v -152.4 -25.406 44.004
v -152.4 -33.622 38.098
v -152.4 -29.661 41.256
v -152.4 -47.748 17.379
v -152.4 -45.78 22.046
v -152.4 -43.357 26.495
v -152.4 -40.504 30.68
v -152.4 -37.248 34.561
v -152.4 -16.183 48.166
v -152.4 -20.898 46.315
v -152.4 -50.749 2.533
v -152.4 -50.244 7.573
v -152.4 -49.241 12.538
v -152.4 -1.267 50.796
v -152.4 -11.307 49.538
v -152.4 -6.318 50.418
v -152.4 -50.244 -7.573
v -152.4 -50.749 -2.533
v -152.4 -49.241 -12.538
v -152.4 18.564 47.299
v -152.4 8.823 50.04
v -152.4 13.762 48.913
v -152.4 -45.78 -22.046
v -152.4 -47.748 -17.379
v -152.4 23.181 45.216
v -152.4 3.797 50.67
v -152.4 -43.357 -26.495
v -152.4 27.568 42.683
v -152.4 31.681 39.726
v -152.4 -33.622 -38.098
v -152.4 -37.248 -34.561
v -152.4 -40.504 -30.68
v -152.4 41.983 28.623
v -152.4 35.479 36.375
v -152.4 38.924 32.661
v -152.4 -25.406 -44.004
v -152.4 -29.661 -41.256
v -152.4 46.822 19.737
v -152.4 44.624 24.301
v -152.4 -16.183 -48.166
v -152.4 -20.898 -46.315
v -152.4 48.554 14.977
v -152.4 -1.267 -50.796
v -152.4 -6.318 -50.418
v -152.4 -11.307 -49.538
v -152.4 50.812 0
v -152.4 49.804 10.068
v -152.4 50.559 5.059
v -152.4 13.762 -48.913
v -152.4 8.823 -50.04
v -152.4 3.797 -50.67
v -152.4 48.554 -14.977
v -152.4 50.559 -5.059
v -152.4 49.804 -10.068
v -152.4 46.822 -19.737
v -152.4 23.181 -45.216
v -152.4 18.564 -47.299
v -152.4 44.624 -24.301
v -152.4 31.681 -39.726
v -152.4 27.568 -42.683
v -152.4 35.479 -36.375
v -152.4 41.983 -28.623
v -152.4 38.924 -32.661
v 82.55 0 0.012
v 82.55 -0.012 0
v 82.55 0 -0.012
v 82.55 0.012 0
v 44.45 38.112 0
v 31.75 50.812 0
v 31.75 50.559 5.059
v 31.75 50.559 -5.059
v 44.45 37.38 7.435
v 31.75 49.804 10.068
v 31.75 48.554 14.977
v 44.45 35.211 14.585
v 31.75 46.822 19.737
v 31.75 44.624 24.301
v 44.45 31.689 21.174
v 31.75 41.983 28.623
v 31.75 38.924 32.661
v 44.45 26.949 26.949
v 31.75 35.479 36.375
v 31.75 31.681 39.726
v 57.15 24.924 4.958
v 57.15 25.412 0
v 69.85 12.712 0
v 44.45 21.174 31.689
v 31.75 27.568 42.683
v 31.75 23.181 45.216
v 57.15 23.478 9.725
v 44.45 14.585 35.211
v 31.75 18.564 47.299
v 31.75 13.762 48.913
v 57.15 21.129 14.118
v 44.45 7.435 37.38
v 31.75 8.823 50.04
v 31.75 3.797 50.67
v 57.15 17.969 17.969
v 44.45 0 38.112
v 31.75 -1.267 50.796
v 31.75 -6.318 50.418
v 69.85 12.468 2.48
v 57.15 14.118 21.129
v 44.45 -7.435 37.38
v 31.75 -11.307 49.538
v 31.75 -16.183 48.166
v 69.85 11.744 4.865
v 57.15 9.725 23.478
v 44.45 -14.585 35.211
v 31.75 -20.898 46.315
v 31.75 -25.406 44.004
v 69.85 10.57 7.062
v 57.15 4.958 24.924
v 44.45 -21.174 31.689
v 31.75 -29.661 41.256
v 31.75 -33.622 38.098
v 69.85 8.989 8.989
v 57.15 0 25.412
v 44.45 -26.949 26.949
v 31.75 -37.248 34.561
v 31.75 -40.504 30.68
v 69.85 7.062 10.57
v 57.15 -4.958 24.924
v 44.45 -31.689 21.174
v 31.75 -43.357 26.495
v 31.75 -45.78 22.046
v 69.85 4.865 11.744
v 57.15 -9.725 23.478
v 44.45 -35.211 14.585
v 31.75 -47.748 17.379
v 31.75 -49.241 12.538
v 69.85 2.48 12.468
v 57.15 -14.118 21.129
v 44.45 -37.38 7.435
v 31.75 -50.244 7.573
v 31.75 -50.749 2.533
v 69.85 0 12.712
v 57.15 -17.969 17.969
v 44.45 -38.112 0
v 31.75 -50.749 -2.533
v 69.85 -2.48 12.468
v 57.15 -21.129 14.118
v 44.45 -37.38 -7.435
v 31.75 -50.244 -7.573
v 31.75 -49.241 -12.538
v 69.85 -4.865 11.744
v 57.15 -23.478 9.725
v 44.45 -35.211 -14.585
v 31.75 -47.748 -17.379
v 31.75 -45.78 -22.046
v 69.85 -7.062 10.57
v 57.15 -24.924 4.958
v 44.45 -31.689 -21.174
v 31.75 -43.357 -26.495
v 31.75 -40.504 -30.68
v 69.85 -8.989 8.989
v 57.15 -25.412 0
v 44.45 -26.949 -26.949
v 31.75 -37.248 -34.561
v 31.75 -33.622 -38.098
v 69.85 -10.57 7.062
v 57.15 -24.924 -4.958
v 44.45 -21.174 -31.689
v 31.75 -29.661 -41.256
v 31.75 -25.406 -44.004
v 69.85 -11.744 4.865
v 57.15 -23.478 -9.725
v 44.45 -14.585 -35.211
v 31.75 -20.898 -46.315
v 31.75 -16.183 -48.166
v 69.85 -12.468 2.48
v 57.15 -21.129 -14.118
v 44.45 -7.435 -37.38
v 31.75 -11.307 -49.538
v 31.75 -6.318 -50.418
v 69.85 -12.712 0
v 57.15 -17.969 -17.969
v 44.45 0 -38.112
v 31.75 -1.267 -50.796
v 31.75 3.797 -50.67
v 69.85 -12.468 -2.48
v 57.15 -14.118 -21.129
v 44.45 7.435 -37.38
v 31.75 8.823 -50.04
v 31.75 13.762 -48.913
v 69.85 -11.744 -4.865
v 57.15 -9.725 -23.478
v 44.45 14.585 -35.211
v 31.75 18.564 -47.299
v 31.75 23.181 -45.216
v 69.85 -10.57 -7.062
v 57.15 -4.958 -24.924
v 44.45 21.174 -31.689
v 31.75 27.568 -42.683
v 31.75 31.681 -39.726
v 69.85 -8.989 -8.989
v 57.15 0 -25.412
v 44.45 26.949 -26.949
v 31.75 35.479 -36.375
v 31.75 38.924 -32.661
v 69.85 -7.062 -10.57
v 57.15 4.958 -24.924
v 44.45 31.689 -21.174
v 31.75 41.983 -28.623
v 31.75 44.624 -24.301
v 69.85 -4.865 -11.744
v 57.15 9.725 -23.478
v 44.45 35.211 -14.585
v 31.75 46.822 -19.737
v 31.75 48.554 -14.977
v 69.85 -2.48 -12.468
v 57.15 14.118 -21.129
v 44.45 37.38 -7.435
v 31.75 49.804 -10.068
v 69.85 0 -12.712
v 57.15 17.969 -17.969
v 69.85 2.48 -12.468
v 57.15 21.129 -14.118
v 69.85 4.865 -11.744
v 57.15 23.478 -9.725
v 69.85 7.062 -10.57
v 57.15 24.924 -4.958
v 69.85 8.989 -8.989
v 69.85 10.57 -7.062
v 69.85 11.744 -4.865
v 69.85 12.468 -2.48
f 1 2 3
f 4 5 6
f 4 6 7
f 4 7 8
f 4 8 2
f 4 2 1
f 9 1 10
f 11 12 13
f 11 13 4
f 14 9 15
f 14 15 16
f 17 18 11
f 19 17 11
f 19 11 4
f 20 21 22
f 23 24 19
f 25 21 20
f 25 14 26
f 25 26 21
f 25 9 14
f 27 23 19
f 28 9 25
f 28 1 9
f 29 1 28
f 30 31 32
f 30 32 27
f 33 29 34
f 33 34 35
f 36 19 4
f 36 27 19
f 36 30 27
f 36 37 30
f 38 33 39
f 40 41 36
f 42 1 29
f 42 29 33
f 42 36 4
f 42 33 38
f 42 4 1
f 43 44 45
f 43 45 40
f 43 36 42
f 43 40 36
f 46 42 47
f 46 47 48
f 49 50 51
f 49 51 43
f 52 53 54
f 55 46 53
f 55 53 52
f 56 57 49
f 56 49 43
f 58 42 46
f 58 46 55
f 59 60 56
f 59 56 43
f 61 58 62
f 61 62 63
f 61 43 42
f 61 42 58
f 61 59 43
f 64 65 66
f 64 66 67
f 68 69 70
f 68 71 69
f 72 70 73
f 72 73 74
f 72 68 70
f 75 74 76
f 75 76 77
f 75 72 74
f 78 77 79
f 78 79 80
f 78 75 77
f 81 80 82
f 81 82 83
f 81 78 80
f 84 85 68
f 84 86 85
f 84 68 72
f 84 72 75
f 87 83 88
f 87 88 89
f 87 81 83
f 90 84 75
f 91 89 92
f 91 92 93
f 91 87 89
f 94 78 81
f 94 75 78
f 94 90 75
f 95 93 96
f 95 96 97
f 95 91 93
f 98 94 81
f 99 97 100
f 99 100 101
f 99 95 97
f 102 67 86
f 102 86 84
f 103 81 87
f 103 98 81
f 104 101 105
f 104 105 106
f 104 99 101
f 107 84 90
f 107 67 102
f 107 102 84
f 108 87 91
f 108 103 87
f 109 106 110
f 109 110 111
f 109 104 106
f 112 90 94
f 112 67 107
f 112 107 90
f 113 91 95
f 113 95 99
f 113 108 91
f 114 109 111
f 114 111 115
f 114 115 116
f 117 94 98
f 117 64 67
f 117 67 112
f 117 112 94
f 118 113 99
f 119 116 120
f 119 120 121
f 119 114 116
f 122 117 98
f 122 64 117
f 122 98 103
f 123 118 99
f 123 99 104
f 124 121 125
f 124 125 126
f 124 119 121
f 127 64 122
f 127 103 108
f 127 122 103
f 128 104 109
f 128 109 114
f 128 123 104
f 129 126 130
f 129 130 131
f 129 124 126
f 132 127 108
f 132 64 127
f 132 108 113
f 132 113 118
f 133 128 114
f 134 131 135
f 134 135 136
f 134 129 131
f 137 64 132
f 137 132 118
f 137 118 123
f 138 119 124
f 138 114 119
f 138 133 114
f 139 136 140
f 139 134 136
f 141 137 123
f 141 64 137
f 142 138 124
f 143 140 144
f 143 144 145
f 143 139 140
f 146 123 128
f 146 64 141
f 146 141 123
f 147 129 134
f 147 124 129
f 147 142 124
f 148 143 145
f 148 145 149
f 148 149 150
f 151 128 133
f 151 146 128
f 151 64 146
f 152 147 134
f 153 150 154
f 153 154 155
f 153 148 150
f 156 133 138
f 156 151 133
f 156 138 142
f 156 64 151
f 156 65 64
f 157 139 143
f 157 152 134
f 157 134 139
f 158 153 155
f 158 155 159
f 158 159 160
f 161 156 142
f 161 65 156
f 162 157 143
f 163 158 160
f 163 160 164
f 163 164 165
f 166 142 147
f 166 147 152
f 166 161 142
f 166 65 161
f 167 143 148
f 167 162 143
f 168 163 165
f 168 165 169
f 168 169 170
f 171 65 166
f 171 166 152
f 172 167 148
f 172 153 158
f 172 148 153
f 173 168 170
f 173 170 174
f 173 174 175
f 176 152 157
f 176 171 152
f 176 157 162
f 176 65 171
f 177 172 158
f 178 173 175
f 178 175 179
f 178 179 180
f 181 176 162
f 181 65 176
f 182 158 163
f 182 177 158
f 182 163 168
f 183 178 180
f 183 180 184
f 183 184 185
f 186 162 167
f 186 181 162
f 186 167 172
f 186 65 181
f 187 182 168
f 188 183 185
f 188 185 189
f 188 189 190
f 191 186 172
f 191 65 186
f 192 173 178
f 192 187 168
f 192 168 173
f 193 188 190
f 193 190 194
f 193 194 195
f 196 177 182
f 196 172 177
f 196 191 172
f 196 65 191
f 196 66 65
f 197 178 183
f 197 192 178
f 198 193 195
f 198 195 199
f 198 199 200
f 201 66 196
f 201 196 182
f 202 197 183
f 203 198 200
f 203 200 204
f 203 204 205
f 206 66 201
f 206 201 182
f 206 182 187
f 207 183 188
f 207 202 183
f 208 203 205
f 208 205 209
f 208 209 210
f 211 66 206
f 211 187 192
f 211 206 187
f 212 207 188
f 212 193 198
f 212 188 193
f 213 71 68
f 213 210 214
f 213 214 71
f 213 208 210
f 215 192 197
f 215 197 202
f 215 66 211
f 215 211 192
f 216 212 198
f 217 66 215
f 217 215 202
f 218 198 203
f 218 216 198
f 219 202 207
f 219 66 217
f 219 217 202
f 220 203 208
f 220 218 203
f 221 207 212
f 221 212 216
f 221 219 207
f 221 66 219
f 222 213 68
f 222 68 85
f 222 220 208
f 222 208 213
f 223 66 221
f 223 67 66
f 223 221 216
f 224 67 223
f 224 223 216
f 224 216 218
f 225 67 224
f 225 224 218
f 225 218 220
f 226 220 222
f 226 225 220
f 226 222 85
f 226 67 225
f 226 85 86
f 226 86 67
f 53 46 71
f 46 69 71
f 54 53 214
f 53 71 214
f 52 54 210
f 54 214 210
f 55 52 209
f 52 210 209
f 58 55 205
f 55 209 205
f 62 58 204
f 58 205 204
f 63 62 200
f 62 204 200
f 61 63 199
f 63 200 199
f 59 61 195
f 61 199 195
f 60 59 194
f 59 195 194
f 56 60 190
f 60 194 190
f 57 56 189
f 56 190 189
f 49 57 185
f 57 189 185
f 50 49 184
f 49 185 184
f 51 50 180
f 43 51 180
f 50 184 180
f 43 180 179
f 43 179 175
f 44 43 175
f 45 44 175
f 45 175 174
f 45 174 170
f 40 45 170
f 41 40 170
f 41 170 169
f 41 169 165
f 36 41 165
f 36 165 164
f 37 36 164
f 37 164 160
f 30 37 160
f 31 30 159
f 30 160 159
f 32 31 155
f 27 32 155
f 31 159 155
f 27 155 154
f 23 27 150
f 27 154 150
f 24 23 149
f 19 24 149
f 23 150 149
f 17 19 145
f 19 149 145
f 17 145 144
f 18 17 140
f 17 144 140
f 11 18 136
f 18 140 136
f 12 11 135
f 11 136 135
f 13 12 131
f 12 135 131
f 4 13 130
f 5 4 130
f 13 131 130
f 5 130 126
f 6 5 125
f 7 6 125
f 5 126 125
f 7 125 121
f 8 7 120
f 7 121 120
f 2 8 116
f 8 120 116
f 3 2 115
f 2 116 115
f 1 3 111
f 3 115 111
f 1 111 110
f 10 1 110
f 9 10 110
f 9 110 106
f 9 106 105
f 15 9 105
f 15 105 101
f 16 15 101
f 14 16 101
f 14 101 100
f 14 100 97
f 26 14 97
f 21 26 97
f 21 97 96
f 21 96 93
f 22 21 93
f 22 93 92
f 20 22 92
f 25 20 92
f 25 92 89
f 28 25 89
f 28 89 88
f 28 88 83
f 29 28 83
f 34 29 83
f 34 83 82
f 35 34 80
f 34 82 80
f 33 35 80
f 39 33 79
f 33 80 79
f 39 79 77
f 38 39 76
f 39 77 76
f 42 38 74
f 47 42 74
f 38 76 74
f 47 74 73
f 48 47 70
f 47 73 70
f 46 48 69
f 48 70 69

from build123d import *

# Parameters (mm, degrees)
F0_R      = 50.811905
F1_DEPTH  = 82.55
F2_SIZE   = 50.8
F1_FACE_R = 50.811905
F3_DEPTH  = 152.4


with BuildPart() as f1:
    # F0 (on Right) → F1 (new body)
    with BuildSketch(Plane.YZ):
        Circle(F0_R)
    extrude(amount=F1_DEPTH)

    # F2
    f2_edges = [f1.edges().sort_by_distance(p)[0] for p in [
        (82.55, -50.811905, 0),
    ]]
    chamfer(f2_edges, length=F2_SIZE)

    # F1_face (on face) → F3 (join)
    with BuildSketch(Plane(origin=(0, 0, 0), x_dir=(0, 1, 0), z_dir=(-1, 0, 0))):
        Circle(F1_FACE_R)
    extrude(amount=F3_DEPTH)


solid = f1.part
